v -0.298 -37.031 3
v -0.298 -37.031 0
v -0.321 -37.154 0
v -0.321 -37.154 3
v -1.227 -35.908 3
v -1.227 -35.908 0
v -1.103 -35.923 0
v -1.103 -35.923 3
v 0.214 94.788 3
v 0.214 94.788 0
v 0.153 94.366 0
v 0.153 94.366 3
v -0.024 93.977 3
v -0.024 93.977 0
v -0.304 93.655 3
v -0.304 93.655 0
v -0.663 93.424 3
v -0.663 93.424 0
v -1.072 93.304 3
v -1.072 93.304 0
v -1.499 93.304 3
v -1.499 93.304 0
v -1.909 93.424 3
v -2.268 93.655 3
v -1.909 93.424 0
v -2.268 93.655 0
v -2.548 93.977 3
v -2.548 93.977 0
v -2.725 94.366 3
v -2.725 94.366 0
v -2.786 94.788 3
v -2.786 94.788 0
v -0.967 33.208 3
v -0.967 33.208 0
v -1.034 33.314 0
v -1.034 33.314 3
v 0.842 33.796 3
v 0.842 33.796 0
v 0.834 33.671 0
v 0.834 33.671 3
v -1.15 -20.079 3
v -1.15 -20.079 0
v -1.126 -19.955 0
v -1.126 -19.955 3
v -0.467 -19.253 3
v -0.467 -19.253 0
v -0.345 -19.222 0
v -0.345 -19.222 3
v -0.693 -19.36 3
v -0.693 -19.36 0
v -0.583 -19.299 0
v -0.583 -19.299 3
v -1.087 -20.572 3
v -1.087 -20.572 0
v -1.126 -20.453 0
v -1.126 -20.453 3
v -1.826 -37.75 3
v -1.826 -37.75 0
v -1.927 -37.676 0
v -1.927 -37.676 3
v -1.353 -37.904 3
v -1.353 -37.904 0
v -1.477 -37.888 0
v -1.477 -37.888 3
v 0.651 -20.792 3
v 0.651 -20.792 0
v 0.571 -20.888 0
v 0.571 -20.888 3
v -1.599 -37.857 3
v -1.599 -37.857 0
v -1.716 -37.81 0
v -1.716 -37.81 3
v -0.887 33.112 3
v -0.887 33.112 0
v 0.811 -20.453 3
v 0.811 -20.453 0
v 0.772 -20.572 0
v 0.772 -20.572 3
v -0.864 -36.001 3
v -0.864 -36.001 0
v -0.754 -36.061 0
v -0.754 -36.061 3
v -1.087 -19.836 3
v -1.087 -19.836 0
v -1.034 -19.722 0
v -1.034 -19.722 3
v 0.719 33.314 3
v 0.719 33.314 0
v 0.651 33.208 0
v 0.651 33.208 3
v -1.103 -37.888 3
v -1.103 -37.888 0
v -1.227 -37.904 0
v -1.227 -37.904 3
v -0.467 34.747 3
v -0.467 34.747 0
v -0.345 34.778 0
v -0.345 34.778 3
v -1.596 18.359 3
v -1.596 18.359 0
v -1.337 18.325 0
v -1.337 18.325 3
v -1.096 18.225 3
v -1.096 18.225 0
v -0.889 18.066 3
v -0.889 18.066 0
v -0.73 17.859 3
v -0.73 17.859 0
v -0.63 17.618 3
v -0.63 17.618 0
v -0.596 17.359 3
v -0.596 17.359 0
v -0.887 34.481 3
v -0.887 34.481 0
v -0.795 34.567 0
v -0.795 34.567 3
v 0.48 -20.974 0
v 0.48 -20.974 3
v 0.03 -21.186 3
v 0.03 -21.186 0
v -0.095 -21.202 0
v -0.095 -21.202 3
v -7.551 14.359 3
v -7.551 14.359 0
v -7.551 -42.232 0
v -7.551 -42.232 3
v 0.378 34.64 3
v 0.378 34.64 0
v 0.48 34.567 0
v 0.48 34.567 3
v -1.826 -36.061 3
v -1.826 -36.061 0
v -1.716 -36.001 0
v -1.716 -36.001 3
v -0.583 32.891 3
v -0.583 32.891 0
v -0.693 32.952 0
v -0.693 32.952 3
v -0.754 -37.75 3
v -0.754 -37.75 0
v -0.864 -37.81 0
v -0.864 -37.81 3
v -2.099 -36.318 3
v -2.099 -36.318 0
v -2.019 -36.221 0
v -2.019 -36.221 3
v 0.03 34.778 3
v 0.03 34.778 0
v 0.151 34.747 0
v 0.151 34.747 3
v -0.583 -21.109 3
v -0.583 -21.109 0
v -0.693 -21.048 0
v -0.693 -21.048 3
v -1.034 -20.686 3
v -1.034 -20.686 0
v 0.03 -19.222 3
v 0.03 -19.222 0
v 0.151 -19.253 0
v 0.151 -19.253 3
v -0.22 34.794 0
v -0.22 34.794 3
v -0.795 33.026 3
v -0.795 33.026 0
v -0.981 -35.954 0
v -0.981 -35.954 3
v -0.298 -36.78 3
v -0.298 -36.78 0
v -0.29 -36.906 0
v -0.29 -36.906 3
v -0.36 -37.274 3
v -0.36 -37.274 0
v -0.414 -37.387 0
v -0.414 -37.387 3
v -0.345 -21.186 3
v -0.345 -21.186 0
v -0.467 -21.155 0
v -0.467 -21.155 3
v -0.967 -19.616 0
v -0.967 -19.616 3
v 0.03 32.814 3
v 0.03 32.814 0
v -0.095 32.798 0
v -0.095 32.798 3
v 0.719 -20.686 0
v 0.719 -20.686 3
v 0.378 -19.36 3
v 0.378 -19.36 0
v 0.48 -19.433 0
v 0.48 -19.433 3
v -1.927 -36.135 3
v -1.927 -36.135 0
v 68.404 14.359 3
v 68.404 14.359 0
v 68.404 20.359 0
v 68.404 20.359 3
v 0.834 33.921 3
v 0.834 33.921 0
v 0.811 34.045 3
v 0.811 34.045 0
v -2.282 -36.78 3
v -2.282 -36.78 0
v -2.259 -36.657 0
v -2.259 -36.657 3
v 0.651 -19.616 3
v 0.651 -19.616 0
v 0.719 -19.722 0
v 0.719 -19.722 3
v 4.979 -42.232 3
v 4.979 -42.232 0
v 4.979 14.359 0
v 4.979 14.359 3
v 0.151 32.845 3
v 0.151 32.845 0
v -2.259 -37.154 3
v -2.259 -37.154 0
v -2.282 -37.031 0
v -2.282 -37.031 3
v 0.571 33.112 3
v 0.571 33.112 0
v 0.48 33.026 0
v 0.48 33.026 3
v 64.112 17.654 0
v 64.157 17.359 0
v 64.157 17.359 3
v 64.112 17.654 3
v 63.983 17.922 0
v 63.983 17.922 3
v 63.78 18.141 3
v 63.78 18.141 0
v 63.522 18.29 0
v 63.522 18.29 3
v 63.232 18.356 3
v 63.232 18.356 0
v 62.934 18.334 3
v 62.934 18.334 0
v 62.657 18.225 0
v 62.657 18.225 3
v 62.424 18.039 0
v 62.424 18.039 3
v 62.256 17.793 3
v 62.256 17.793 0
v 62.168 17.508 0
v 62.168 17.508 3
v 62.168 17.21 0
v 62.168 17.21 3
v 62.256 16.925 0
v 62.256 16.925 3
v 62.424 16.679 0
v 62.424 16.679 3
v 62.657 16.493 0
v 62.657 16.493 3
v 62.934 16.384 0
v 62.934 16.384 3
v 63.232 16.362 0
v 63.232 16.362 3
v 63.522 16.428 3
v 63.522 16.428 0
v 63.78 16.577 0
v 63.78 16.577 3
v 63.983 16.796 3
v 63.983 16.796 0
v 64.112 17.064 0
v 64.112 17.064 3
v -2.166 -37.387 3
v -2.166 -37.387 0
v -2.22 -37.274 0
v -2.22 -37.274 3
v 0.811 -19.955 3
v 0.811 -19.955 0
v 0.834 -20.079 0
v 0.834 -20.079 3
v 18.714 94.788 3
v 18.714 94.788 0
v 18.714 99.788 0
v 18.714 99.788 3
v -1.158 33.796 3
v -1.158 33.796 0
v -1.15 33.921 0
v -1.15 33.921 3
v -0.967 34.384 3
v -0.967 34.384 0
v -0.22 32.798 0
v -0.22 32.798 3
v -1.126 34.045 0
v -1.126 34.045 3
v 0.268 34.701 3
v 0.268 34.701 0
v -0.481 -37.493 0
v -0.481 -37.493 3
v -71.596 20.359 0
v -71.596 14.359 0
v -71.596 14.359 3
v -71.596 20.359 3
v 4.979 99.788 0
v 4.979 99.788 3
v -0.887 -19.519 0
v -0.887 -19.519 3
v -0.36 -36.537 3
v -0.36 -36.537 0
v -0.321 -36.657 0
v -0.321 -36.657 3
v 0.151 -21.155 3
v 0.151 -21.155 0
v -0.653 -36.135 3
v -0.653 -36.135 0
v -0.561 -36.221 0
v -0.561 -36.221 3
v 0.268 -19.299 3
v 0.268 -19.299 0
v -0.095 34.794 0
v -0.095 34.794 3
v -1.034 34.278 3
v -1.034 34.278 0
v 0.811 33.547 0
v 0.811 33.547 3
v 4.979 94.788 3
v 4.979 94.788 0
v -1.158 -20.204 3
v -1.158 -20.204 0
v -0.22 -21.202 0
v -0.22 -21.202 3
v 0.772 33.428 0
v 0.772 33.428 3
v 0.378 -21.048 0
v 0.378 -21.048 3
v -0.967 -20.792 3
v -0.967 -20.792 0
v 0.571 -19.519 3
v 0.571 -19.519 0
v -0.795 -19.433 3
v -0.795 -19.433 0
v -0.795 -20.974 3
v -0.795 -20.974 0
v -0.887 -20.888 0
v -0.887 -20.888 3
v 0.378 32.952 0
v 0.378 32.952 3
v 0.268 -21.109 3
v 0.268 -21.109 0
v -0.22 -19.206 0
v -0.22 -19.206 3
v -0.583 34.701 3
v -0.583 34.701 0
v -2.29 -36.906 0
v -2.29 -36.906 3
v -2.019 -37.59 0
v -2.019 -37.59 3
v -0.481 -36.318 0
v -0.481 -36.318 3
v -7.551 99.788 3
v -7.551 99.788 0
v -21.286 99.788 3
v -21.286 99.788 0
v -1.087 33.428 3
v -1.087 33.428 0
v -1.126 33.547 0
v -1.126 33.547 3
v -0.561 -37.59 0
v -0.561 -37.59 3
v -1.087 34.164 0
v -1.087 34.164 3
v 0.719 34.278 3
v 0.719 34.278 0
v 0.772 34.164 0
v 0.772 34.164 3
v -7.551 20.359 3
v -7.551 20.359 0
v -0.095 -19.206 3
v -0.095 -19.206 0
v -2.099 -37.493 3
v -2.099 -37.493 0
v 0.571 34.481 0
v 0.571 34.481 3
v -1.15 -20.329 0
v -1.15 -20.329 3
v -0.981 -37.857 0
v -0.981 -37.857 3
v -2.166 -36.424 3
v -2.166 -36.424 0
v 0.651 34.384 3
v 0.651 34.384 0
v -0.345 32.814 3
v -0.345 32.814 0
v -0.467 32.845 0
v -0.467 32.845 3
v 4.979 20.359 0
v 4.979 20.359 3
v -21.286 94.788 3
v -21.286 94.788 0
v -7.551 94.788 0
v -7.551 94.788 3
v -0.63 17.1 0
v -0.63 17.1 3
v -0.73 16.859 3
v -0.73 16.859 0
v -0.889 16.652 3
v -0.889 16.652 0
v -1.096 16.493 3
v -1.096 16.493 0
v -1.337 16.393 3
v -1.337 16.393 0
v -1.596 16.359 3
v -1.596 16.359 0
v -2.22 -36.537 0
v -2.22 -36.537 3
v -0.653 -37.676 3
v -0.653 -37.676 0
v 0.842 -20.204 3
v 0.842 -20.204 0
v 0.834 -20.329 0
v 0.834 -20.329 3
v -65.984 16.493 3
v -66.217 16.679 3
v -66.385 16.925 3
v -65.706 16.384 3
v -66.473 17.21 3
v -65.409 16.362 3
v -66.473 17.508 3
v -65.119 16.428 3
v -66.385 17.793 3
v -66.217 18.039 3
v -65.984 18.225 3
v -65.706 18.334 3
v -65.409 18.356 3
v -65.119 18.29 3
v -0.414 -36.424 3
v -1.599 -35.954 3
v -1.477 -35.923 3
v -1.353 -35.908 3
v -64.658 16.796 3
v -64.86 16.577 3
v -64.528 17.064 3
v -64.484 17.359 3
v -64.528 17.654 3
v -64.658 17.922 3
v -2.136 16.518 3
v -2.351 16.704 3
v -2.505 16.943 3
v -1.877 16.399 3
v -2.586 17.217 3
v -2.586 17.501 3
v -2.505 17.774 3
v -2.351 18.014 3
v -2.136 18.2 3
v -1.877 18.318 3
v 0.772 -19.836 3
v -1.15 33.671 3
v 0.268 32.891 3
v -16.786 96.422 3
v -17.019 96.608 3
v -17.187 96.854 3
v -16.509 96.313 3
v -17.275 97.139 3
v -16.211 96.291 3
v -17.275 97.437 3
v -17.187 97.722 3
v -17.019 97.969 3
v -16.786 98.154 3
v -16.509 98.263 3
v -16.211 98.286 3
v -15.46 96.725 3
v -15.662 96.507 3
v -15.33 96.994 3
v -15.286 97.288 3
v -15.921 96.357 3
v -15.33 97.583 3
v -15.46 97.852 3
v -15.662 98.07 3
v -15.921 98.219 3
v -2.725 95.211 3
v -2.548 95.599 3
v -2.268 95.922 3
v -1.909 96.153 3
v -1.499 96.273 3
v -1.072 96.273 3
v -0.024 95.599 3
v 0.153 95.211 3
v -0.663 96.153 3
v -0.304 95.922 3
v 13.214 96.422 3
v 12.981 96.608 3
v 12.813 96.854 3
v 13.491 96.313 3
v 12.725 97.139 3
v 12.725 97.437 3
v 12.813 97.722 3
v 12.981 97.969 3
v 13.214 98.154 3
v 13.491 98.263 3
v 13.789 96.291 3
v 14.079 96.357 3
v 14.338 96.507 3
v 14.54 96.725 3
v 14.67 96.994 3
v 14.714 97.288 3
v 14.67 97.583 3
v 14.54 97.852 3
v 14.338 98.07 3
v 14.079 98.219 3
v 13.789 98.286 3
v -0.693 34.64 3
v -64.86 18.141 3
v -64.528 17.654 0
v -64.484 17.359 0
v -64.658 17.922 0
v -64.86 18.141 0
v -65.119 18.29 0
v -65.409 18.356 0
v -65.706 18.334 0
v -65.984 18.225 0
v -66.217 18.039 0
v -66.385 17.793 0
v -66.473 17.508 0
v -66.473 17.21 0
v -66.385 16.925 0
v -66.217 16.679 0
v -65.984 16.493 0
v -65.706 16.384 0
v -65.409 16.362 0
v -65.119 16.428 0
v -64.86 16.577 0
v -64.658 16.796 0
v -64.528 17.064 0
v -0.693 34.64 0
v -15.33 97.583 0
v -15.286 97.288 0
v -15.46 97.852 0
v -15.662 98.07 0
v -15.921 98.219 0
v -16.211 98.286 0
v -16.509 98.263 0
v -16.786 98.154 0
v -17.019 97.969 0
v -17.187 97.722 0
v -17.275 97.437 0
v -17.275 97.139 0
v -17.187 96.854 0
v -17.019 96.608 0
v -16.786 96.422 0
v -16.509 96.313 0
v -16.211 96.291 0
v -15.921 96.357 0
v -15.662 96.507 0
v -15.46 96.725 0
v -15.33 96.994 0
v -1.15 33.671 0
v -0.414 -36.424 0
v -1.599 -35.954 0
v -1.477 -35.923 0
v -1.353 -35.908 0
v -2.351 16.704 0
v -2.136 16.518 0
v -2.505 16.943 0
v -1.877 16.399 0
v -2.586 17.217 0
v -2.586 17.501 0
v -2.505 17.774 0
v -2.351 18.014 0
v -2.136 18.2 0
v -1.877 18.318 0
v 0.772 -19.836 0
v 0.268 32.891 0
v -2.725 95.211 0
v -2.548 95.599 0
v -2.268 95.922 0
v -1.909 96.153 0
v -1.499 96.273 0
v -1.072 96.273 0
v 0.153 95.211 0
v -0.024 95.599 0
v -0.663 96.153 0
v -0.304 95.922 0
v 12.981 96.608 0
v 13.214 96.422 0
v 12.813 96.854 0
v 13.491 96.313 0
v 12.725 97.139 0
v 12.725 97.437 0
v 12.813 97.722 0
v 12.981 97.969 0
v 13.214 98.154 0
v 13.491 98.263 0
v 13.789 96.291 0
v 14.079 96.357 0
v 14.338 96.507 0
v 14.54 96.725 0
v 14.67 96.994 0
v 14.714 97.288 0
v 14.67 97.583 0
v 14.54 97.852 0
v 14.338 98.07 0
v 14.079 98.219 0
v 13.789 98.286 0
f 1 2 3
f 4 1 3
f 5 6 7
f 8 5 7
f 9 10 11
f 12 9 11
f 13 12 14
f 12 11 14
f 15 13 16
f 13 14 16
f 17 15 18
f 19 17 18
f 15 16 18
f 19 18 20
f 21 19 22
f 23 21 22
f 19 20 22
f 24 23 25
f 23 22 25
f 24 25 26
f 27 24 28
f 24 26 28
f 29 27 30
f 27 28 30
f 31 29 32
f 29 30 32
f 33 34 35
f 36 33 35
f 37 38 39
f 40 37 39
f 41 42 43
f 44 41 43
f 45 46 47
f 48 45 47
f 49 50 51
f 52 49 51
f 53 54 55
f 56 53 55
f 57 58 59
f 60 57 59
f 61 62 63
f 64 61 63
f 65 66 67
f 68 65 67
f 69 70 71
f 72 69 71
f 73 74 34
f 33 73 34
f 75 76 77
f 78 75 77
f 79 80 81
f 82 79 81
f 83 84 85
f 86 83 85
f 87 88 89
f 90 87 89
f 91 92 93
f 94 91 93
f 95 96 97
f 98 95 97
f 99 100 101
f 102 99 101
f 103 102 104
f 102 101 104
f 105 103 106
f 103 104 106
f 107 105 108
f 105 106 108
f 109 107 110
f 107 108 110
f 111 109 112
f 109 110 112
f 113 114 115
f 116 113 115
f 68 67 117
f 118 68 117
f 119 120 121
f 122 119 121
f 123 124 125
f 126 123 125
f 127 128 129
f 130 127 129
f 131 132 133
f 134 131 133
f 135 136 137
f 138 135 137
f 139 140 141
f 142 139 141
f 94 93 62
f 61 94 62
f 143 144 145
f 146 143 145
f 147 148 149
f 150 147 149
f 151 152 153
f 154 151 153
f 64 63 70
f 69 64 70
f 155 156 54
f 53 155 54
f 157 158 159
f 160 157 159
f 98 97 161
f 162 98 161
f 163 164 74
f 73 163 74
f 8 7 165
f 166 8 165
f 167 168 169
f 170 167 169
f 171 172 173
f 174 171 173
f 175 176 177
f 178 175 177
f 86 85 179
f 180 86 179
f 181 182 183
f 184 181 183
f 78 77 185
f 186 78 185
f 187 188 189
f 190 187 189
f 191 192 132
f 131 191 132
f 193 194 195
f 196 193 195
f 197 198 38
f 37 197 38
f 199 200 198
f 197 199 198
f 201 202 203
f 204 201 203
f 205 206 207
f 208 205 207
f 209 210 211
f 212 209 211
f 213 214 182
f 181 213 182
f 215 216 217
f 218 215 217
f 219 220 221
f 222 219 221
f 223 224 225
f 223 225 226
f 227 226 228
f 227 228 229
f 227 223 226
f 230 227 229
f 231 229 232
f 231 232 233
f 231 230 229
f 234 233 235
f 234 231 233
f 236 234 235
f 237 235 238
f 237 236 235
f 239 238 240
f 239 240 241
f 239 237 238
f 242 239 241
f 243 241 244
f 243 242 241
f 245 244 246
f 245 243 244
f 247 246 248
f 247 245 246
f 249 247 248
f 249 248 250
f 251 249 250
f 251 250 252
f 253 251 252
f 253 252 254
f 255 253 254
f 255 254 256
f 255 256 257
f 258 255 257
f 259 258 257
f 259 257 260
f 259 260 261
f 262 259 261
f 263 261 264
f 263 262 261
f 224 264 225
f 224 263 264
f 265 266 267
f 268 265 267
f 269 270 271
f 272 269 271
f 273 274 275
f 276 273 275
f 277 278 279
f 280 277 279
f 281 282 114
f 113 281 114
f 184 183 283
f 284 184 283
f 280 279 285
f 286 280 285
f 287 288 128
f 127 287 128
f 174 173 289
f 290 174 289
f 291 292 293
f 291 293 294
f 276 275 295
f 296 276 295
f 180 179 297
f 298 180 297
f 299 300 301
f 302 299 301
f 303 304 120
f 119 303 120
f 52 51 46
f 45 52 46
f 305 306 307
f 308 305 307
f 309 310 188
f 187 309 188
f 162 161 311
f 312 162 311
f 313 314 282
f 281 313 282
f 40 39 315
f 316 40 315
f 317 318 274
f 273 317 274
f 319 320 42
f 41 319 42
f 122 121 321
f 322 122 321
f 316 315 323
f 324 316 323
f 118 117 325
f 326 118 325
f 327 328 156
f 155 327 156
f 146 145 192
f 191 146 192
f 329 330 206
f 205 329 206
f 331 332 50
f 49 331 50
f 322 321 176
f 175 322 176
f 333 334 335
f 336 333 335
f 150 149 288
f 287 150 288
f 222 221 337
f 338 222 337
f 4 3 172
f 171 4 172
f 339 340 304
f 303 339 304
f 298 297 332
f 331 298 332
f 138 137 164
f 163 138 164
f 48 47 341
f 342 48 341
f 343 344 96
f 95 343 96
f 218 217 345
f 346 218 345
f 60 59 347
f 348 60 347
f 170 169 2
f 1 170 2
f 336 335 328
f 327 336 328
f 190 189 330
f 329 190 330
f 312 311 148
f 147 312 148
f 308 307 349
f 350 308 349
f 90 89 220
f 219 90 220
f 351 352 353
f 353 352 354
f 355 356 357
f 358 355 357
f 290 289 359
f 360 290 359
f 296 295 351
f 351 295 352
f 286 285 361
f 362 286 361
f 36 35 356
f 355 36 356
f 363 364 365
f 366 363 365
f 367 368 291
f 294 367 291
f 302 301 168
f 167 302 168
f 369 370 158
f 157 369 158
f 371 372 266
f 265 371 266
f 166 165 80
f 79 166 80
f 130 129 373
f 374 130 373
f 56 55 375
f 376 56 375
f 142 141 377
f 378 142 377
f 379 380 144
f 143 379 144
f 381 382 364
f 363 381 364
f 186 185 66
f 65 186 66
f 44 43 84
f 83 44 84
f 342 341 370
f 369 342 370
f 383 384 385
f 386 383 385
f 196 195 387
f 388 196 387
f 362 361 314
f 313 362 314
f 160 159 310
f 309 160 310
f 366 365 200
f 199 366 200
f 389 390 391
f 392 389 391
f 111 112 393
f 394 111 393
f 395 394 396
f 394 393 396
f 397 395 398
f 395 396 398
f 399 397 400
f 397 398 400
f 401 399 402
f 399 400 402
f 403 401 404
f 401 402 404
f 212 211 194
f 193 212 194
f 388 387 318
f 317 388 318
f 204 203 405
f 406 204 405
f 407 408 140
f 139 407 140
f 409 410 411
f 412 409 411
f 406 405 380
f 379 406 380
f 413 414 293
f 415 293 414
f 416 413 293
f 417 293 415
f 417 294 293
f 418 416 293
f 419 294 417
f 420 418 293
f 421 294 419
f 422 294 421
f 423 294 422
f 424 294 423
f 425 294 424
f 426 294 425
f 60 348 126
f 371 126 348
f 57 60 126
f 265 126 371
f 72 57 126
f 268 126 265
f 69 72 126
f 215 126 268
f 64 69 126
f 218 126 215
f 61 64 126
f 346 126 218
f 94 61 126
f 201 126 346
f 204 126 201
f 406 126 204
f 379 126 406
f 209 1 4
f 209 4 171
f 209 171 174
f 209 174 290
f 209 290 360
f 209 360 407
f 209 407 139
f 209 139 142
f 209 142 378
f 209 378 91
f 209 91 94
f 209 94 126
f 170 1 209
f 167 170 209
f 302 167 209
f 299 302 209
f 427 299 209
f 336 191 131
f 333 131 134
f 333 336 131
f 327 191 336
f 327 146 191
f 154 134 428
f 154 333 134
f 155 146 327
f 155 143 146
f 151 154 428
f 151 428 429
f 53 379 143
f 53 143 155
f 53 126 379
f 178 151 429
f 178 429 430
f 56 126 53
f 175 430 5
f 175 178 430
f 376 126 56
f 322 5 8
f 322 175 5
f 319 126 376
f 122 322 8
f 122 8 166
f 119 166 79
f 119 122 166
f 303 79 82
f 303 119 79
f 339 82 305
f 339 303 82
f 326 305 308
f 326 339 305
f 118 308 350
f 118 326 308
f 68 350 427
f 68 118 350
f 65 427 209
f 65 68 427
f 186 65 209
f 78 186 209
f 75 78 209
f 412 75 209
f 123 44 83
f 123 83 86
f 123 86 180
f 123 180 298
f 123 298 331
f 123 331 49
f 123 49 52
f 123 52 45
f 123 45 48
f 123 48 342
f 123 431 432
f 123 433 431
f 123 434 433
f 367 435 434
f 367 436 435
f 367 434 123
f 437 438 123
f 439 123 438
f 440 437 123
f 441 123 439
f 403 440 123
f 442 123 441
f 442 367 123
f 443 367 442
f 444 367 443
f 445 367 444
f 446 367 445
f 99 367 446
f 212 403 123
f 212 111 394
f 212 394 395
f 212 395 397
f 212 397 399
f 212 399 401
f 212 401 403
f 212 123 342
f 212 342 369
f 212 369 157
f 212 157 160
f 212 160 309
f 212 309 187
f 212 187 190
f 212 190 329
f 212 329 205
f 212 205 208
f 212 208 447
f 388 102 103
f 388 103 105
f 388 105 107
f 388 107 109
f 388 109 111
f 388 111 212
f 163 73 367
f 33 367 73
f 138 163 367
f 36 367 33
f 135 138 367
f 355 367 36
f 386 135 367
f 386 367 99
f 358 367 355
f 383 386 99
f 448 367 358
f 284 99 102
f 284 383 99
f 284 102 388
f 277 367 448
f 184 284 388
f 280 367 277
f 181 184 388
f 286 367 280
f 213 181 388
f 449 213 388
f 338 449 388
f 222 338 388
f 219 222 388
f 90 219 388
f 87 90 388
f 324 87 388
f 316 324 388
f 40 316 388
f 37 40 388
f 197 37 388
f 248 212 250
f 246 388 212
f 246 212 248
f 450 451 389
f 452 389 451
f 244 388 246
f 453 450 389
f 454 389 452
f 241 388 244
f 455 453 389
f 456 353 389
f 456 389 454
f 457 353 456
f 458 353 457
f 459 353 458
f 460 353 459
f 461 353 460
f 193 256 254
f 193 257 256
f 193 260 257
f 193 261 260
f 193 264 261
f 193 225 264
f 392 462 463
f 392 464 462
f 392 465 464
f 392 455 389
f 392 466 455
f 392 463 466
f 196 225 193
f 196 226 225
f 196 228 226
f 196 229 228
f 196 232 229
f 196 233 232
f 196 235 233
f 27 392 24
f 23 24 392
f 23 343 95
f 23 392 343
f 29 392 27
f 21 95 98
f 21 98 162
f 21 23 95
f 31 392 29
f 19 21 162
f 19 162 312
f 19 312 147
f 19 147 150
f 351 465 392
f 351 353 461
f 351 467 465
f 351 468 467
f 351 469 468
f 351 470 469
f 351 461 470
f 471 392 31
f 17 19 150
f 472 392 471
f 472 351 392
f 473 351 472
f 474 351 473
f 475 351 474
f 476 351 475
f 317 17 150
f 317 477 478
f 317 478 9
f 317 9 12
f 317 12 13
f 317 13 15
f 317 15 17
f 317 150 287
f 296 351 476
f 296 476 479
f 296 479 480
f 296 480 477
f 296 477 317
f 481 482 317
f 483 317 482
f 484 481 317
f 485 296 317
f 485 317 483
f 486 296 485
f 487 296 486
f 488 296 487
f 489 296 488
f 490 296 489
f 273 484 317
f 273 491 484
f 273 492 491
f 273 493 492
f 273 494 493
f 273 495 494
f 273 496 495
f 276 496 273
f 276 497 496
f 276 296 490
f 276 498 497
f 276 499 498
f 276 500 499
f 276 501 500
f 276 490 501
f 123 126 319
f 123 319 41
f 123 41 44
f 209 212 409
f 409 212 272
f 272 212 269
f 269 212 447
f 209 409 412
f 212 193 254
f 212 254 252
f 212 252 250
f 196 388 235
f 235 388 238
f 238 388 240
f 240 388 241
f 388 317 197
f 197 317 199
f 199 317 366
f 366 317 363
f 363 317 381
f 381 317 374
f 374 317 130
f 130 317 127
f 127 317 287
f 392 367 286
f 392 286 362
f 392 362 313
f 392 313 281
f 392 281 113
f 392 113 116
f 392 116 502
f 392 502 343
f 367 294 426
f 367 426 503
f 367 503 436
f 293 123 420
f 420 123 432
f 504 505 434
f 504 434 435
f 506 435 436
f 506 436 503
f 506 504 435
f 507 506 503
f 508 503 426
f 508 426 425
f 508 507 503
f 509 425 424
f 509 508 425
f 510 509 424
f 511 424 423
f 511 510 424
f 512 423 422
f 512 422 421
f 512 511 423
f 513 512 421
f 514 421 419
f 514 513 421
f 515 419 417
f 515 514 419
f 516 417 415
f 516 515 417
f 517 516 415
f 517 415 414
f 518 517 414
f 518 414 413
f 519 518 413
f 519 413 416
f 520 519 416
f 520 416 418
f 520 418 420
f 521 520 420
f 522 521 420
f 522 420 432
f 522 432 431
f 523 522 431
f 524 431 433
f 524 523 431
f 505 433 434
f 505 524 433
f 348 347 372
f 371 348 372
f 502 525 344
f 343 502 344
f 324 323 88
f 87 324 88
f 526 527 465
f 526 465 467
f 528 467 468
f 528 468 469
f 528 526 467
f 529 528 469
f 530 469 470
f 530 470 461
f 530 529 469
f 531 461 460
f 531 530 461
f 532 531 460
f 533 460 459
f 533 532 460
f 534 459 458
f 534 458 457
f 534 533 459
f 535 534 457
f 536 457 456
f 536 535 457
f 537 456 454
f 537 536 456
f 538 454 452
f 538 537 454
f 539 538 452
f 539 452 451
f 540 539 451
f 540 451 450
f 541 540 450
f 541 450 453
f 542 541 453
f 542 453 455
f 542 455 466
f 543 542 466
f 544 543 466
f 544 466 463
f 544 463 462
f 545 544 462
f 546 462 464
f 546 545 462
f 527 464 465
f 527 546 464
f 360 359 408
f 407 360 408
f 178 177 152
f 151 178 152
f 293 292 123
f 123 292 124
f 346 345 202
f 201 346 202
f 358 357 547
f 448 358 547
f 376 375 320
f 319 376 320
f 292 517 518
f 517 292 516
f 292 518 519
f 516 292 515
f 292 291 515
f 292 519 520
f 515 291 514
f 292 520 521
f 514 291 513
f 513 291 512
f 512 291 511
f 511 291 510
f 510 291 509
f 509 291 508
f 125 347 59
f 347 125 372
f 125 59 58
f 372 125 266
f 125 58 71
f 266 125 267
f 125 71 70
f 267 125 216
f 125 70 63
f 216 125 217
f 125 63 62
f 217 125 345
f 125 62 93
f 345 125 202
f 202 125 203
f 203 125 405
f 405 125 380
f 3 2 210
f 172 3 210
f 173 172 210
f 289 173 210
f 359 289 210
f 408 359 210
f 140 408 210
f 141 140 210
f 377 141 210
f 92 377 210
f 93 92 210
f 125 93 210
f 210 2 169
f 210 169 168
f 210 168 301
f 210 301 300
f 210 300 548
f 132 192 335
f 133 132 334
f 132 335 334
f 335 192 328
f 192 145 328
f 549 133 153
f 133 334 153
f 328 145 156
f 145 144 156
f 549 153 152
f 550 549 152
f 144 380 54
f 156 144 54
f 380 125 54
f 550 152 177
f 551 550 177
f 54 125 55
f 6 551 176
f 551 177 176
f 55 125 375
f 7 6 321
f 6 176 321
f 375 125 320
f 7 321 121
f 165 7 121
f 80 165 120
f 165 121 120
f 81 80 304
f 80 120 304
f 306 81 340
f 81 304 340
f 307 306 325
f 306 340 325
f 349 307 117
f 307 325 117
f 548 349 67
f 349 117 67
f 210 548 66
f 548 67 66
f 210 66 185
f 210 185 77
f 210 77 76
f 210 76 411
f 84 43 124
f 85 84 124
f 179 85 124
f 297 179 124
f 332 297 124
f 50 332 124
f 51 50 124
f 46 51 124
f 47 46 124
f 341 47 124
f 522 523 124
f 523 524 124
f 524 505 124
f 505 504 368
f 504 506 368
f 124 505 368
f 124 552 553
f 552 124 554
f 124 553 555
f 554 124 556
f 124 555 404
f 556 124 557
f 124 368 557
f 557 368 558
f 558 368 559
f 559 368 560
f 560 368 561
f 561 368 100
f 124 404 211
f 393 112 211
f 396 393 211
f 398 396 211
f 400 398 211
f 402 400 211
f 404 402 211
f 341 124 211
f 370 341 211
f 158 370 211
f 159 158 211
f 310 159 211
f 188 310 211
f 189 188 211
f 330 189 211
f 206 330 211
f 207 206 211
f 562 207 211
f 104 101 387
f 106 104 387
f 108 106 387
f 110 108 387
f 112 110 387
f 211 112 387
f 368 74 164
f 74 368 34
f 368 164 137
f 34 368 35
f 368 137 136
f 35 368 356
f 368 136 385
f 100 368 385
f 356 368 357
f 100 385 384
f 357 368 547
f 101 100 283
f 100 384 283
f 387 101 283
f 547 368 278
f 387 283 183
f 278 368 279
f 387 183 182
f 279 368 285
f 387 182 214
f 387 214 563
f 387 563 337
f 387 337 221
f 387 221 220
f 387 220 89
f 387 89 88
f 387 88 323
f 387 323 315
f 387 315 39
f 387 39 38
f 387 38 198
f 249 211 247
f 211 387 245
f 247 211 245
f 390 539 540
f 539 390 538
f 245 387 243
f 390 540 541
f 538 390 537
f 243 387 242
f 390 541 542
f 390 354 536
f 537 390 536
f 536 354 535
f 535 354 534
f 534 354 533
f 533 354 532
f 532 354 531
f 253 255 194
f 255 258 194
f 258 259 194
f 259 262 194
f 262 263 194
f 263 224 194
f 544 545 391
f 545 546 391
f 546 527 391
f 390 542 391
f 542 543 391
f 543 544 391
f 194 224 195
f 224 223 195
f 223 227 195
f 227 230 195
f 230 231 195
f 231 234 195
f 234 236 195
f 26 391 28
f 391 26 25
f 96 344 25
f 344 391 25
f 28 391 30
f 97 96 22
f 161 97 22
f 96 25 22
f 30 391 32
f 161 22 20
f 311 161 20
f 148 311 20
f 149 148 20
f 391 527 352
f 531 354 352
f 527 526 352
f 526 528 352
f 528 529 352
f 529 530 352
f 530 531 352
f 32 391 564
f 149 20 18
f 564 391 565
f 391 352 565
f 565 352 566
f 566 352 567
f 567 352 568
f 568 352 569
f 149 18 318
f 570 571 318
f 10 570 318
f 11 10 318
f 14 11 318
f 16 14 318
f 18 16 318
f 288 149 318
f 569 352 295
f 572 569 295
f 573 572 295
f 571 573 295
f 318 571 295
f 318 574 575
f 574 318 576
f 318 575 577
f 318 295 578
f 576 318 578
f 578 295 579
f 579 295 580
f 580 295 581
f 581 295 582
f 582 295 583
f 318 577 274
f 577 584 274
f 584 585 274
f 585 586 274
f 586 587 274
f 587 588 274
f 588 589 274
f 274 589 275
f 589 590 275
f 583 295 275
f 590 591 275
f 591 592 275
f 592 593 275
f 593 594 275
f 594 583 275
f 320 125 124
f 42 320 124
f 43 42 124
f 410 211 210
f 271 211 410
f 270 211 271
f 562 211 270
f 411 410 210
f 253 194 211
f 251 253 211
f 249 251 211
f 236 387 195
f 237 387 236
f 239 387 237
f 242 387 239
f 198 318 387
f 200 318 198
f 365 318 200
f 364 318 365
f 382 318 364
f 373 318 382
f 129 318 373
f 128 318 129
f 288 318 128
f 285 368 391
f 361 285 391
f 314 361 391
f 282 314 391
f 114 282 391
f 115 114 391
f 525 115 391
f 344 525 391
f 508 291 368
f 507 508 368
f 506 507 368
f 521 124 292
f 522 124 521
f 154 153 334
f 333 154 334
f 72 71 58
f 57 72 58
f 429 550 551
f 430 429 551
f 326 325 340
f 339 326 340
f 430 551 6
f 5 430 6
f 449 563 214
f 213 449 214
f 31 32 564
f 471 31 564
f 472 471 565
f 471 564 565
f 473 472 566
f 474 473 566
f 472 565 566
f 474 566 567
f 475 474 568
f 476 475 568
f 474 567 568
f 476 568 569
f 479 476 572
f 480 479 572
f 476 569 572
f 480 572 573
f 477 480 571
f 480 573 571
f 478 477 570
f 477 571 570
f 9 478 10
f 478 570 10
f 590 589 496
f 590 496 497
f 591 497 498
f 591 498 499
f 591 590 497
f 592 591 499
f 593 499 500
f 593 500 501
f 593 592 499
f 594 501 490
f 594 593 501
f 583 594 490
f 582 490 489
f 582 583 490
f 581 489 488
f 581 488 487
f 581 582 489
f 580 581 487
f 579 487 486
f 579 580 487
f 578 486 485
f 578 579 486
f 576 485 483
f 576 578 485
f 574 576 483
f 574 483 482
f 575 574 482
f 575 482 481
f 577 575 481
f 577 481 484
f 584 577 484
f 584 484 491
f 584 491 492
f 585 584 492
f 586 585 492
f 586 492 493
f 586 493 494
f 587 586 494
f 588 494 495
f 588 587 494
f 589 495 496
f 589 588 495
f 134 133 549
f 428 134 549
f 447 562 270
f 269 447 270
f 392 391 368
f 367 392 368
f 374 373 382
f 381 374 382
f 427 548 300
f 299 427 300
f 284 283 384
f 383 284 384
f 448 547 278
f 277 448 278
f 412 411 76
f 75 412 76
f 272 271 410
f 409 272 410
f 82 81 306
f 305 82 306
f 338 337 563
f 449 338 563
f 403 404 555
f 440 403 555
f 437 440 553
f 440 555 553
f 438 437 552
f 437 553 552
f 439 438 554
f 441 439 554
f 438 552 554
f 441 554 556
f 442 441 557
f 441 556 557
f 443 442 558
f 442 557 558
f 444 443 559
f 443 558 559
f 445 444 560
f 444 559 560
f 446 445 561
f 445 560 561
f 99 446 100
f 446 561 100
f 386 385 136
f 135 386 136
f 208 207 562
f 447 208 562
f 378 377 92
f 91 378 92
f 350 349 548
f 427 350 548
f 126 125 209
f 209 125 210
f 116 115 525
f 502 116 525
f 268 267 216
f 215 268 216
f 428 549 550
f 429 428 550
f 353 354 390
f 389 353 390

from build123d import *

# Parameters (mm, degrees)
F0_W     = 64.0446986989
F0_H     = 6
F0_R     = 1
F0_W_2   = 63.4251574627
F1_DEPTH = 3


# Not quite as in the source:
# - ends of sketch curves that miss each other by under 0.0002 mm in the source are joined
# - a feature names something its author has since deleted; it is built from what else it names


with BuildPart() as f1:
    # F0 (on Top) → F1 (new body)
    with BuildSketch(Plane.XY):
        Polygon((-7.5510093011, -42.2321148217), (-1.289947, -42.2321148217), (4.9791345373, -42.2321148217), (4.9791345373, 14.358856), (-1.595708, 14.358856), (-7.5510093011, 14.358856), align=None)
        Polygon((-0.297832, -36.78021), (-0.289947, -36.905543), (-0.297832, -37.030876), (-0.321364, -37.154233), (-0.360171, -37.273667), (-0.41364, -37.387296), (-0.48093, -37.493328), (-0.560978, -37.59009), (-0.652523, -37.676056), (-0.75412, -37.749871), (-0.864168, -37.81037), (-0.98093, -37.856599), (-1.102566, -37.88783), (-1.227157, -37.90357), (-1.352738, -37.90357), (-1.477328, -37.88783), (-1.598964, -37.856599), (-1.715726, -37.81037), (-1.825774, -37.749871), (-1.927371, -37.676056), (-2.018916, -37.59009), (-2.098964, -37.493328), (-2.166254, -37.387296), (-2.219724, -37.273667), (-2.25853, -37.154233), (-2.282062, -37.030876), (-2.289947, -36.905543), (-2.282062, -36.78021), (-2.25853, -36.656853), (-2.219724, -36.537418), (-2.166254, -36.423789), (-2.098964, -36.317758), (-2.018916, -36.220996), (-1.927371, -36.13503), (-1.825774, -36.061215), (-1.715726, -36.000716), (-1.598964, -35.954486), (-1.477328, -35.923256), (-1.352738, -35.907516), (-1.227157, -35.907516), (-1.102566, -35.923256), (-0.98093, -35.954486), (-0.864168, -36.000716), (-0.75412, -36.061215), (-0.652523, -36.13503), (-0.560978, -36.220996), (-0.48093, -36.317758), (-0.41364, -36.423789), (-0.360171, -36.537418), (-0.321364, -36.656853), align=None, mode=Mode.SUBTRACT)
        Polygon((0.834477, -20.078598), (0.842362, -20.203931), (0.834477, -20.329264), (0.810945, -20.452621), (0.772138, -20.572056), (0.718669, -20.685685), (0.651379, -20.791716), (0.571331, -20.888478), (0.479786, -20.974444), (0.378189, -21.048259), (0.268141, -21.108758), (0.151379, -21.154988), (0.029743, -21.186218), (-0.094848, -21.201958), (-0.220429, -21.201958), (-0.345019, -21.186218), (-0.466655, -21.154988), (-0.583417, -21.108758), (-0.693465, -21.048259), (-0.795062, -20.974444), (-0.886607, -20.888478), (-0.966655, -20.791716), (-1.033945, -20.685685), (-1.087415, -20.572056), (-1.126221, -20.452621), (-1.149753, -20.329264), (-1.157638, -20.203931), (-1.149753, -20.078598), (-1.126221, -19.955241), (-1.087415, -19.835807), (-1.033945, -19.722178), (-0.966655, -19.616146), (-0.886607, -19.519384), (-0.795062, -19.433418), (-0.693465, -19.359603), (-0.583417, -19.299104), (-0.466655, -19.252875), (-0.345019, -19.221644), (-0.220429, -19.205904), (-0.094848, -19.205904), (0.029743, -19.221644), (0.151379, -19.252875), (0.268141, -19.299104), (0.378189, -19.359603), (0.479786, -19.433418), (0.571331, -19.519384), (0.651379, -19.616146), (0.718669, -19.722178), (0.772138, -19.835807), (0.810945, -19.955241), align=None, mode=Mode.SUBTRACT)
        with Locations((-39.5733586505, 17.358856)):
            Rectangle(F0_W, F0_H)
        with Locations((-65.4838681221, 17.358856)):
            Circle(F0_R, mode=Mode.SUBTRACT)
        with BuildLine():
            Line((-7.5510093011, 20.358856), (-7.5510093011, 14.358856))
            Line((-7.5510093011, 14.358856), (-1.595708, 14.358856))
            Line((-1.595708, 14.358856), (-1.595708, 16.358856))
            ThreePointArc((-1.595708, 16.358856), (-2.595708, 17.358856), (-1.595708, 18.358856))
            Line((-1.595708, 18.358856), (-1.595708, 20.358856))
            Line((-1.595708, 20.358856), (-7.5510093011, 20.358856))
        make_face()
        with BuildLine():
            Line((-1.595708, 14.358856), (4.9791345373, 14.358856))
            Line((4.9791345373, 14.358856), (4.9791345373, 20.358856))
            Line((4.9791345373, 20.358856), (-1.595708, 20.358856))
            Line((-1.595708, 20.358856), (-1.595708, 18.358856))
            ThreePointArc((-1.595708, 18.358856), (-0.8886012188, 18.0659627812), (-0.595708, 17.358856))
            ThreePointArc((-0.595708, 17.358856), (-0.8886012188, 16.6517492188), (-1.595708, 16.358856))
            Line((-1.595708, 16.358856), (-1.595708, 14.358856))
        make_face()
        with Locations((36.6917132686, 17.358856)):
            Rectangle(F0_W_2, F0_H)
        with Locations((63.1569251418, 17.358856)):
            Circle(F0_R, mode=Mode.SUBTRACT)
        Polygon((-7.5510093011, 39.788339287), (-7.5510093011, 20.358856), (-1.595708, 20.358856), (4.9791345373, 20.358856), (4.9791345373, 28.8824737072), (4.9791345373, 39.788339287), (-1.289947, 39.788339287), align=None)
        Polygon((0.834477, 33.921402), (0.842362, 33.796069), (0.834477, 33.670736), (0.810945, 33.547379), (0.772138, 33.427944), (0.718669, 33.314315), (0.651379, 33.208284), (0.571331, 33.111522), (0.479786, 33.025556), (0.378189, 32.951741), (0.268141, 32.891242), (0.151379, 32.845012), (0.029743, 32.813782), (-0.094848, 32.798042), (-0.220429, 32.798042), (-0.345019, 32.813782), (-0.466655, 32.845012), (-0.583417, 32.891242), (-0.693465, 32.951741), (-0.795062, 33.025556), (-0.886607, 33.111522), (-0.966655, 33.208284), (-1.033945, 33.314315), (-1.087415, 33.427944), (-1.126221, 33.547379), (-1.149753, 33.670736), (-1.157638, 33.796069), (-1.149753, 33.921402), (-1.126221, 34.044759), (-1.087415, 34.164193), (-1.033945, 34.277822), (-0.966655, 34.383854), (-0.886607, 34.480616), (-0.795062, 34.566582), (-0.693465, 34.640397), (-0.583417, 34.700896), (-0.466655, 34.747125), (-0.345019, 34.778356), (-0.220429, 34.794096), (-0.094848, 34.794096), (0.029743, 34.778356), (0.151379, 34.747125), (0.268141, 34.700896), (0.378189, 34.640397), (0.479786, 34.566582), (0.571331, 34.480616), (0.651379, 34.383854), (0.718669, 34.277822), (0.772138, 34.164193), (0.810945, 34.044759), align=None, mode=Mode.SUBTRACT)
        with BuildLine():
            Line((-7.5510093011, 94.7883501649), (-7.5510093011, 39.788339287))
            Line((-7.5510093011, 39.788339287), (-1.289947, 39.788339287))
            Line((-1.289947, 39.788339287), (4.9791345373, 39.788339287))
            Line((4.9791345373, 39.788339287), (4.9791345373, 94.7883501649))
            Line((4.9791345373, 94.7883501649), (0.2140626181, 94.7883501649))
            ThreePointArc((0.2140626181, 94.7883501649), (-1.2859428208, 93.2883392871), (-2.7859373819, 94.7883501649))
            Line((-2.7859373819, 94.7883501649), (-7.5510093011, 94.7883501649))
        make_face()
        Polygon((-21.2859819876, 94.7883501649), (-7.5510093011, 94.7883501649), (-7.5510093011, 99.788339287), (-21.2859819876, 99.7883501649), align=None)
        with Locations((-16.2859819876, 97.2883501649)):
            Circle(F0_R, mode=Mode.SUBTRACT)
        with BuildLine():
            Line((-7.5510093011, 99.788339287), (-7.5510093011, 94.7883501649))
            Line((-7.5510093011, 94.7883501649), (-2.7859373819, 94.7883501649))
            ThreePointArc((-2.7859373819, 94.7883501649), (-1.285931943, 96.288339287), (0.2140626181, 94.788339287))
            Line((0.2140626181, 94.788339287), (4.9791345373, 94.7883501649))
            Line((4.9791345373, 94.7883501649), (4.9791345373, 99.788339287))
            Line((4.9791345373, 99.788339287), (-7.5510093011, 99.788339287))
        make_face()
        Polygon((4.9791345373, 99.788339287), (4.9791345373, 94.7883501649), (18.7140180124, 94.7883501649), (18.7140180124, 99.7883501649), align=None)
        with Locations((13.7140180124, 97.2883501649)):
            Circle(F0_R, mode=Mode.SUBTRACT)
    extrude(amount=F1_DEPTH)


solid = f1.part
